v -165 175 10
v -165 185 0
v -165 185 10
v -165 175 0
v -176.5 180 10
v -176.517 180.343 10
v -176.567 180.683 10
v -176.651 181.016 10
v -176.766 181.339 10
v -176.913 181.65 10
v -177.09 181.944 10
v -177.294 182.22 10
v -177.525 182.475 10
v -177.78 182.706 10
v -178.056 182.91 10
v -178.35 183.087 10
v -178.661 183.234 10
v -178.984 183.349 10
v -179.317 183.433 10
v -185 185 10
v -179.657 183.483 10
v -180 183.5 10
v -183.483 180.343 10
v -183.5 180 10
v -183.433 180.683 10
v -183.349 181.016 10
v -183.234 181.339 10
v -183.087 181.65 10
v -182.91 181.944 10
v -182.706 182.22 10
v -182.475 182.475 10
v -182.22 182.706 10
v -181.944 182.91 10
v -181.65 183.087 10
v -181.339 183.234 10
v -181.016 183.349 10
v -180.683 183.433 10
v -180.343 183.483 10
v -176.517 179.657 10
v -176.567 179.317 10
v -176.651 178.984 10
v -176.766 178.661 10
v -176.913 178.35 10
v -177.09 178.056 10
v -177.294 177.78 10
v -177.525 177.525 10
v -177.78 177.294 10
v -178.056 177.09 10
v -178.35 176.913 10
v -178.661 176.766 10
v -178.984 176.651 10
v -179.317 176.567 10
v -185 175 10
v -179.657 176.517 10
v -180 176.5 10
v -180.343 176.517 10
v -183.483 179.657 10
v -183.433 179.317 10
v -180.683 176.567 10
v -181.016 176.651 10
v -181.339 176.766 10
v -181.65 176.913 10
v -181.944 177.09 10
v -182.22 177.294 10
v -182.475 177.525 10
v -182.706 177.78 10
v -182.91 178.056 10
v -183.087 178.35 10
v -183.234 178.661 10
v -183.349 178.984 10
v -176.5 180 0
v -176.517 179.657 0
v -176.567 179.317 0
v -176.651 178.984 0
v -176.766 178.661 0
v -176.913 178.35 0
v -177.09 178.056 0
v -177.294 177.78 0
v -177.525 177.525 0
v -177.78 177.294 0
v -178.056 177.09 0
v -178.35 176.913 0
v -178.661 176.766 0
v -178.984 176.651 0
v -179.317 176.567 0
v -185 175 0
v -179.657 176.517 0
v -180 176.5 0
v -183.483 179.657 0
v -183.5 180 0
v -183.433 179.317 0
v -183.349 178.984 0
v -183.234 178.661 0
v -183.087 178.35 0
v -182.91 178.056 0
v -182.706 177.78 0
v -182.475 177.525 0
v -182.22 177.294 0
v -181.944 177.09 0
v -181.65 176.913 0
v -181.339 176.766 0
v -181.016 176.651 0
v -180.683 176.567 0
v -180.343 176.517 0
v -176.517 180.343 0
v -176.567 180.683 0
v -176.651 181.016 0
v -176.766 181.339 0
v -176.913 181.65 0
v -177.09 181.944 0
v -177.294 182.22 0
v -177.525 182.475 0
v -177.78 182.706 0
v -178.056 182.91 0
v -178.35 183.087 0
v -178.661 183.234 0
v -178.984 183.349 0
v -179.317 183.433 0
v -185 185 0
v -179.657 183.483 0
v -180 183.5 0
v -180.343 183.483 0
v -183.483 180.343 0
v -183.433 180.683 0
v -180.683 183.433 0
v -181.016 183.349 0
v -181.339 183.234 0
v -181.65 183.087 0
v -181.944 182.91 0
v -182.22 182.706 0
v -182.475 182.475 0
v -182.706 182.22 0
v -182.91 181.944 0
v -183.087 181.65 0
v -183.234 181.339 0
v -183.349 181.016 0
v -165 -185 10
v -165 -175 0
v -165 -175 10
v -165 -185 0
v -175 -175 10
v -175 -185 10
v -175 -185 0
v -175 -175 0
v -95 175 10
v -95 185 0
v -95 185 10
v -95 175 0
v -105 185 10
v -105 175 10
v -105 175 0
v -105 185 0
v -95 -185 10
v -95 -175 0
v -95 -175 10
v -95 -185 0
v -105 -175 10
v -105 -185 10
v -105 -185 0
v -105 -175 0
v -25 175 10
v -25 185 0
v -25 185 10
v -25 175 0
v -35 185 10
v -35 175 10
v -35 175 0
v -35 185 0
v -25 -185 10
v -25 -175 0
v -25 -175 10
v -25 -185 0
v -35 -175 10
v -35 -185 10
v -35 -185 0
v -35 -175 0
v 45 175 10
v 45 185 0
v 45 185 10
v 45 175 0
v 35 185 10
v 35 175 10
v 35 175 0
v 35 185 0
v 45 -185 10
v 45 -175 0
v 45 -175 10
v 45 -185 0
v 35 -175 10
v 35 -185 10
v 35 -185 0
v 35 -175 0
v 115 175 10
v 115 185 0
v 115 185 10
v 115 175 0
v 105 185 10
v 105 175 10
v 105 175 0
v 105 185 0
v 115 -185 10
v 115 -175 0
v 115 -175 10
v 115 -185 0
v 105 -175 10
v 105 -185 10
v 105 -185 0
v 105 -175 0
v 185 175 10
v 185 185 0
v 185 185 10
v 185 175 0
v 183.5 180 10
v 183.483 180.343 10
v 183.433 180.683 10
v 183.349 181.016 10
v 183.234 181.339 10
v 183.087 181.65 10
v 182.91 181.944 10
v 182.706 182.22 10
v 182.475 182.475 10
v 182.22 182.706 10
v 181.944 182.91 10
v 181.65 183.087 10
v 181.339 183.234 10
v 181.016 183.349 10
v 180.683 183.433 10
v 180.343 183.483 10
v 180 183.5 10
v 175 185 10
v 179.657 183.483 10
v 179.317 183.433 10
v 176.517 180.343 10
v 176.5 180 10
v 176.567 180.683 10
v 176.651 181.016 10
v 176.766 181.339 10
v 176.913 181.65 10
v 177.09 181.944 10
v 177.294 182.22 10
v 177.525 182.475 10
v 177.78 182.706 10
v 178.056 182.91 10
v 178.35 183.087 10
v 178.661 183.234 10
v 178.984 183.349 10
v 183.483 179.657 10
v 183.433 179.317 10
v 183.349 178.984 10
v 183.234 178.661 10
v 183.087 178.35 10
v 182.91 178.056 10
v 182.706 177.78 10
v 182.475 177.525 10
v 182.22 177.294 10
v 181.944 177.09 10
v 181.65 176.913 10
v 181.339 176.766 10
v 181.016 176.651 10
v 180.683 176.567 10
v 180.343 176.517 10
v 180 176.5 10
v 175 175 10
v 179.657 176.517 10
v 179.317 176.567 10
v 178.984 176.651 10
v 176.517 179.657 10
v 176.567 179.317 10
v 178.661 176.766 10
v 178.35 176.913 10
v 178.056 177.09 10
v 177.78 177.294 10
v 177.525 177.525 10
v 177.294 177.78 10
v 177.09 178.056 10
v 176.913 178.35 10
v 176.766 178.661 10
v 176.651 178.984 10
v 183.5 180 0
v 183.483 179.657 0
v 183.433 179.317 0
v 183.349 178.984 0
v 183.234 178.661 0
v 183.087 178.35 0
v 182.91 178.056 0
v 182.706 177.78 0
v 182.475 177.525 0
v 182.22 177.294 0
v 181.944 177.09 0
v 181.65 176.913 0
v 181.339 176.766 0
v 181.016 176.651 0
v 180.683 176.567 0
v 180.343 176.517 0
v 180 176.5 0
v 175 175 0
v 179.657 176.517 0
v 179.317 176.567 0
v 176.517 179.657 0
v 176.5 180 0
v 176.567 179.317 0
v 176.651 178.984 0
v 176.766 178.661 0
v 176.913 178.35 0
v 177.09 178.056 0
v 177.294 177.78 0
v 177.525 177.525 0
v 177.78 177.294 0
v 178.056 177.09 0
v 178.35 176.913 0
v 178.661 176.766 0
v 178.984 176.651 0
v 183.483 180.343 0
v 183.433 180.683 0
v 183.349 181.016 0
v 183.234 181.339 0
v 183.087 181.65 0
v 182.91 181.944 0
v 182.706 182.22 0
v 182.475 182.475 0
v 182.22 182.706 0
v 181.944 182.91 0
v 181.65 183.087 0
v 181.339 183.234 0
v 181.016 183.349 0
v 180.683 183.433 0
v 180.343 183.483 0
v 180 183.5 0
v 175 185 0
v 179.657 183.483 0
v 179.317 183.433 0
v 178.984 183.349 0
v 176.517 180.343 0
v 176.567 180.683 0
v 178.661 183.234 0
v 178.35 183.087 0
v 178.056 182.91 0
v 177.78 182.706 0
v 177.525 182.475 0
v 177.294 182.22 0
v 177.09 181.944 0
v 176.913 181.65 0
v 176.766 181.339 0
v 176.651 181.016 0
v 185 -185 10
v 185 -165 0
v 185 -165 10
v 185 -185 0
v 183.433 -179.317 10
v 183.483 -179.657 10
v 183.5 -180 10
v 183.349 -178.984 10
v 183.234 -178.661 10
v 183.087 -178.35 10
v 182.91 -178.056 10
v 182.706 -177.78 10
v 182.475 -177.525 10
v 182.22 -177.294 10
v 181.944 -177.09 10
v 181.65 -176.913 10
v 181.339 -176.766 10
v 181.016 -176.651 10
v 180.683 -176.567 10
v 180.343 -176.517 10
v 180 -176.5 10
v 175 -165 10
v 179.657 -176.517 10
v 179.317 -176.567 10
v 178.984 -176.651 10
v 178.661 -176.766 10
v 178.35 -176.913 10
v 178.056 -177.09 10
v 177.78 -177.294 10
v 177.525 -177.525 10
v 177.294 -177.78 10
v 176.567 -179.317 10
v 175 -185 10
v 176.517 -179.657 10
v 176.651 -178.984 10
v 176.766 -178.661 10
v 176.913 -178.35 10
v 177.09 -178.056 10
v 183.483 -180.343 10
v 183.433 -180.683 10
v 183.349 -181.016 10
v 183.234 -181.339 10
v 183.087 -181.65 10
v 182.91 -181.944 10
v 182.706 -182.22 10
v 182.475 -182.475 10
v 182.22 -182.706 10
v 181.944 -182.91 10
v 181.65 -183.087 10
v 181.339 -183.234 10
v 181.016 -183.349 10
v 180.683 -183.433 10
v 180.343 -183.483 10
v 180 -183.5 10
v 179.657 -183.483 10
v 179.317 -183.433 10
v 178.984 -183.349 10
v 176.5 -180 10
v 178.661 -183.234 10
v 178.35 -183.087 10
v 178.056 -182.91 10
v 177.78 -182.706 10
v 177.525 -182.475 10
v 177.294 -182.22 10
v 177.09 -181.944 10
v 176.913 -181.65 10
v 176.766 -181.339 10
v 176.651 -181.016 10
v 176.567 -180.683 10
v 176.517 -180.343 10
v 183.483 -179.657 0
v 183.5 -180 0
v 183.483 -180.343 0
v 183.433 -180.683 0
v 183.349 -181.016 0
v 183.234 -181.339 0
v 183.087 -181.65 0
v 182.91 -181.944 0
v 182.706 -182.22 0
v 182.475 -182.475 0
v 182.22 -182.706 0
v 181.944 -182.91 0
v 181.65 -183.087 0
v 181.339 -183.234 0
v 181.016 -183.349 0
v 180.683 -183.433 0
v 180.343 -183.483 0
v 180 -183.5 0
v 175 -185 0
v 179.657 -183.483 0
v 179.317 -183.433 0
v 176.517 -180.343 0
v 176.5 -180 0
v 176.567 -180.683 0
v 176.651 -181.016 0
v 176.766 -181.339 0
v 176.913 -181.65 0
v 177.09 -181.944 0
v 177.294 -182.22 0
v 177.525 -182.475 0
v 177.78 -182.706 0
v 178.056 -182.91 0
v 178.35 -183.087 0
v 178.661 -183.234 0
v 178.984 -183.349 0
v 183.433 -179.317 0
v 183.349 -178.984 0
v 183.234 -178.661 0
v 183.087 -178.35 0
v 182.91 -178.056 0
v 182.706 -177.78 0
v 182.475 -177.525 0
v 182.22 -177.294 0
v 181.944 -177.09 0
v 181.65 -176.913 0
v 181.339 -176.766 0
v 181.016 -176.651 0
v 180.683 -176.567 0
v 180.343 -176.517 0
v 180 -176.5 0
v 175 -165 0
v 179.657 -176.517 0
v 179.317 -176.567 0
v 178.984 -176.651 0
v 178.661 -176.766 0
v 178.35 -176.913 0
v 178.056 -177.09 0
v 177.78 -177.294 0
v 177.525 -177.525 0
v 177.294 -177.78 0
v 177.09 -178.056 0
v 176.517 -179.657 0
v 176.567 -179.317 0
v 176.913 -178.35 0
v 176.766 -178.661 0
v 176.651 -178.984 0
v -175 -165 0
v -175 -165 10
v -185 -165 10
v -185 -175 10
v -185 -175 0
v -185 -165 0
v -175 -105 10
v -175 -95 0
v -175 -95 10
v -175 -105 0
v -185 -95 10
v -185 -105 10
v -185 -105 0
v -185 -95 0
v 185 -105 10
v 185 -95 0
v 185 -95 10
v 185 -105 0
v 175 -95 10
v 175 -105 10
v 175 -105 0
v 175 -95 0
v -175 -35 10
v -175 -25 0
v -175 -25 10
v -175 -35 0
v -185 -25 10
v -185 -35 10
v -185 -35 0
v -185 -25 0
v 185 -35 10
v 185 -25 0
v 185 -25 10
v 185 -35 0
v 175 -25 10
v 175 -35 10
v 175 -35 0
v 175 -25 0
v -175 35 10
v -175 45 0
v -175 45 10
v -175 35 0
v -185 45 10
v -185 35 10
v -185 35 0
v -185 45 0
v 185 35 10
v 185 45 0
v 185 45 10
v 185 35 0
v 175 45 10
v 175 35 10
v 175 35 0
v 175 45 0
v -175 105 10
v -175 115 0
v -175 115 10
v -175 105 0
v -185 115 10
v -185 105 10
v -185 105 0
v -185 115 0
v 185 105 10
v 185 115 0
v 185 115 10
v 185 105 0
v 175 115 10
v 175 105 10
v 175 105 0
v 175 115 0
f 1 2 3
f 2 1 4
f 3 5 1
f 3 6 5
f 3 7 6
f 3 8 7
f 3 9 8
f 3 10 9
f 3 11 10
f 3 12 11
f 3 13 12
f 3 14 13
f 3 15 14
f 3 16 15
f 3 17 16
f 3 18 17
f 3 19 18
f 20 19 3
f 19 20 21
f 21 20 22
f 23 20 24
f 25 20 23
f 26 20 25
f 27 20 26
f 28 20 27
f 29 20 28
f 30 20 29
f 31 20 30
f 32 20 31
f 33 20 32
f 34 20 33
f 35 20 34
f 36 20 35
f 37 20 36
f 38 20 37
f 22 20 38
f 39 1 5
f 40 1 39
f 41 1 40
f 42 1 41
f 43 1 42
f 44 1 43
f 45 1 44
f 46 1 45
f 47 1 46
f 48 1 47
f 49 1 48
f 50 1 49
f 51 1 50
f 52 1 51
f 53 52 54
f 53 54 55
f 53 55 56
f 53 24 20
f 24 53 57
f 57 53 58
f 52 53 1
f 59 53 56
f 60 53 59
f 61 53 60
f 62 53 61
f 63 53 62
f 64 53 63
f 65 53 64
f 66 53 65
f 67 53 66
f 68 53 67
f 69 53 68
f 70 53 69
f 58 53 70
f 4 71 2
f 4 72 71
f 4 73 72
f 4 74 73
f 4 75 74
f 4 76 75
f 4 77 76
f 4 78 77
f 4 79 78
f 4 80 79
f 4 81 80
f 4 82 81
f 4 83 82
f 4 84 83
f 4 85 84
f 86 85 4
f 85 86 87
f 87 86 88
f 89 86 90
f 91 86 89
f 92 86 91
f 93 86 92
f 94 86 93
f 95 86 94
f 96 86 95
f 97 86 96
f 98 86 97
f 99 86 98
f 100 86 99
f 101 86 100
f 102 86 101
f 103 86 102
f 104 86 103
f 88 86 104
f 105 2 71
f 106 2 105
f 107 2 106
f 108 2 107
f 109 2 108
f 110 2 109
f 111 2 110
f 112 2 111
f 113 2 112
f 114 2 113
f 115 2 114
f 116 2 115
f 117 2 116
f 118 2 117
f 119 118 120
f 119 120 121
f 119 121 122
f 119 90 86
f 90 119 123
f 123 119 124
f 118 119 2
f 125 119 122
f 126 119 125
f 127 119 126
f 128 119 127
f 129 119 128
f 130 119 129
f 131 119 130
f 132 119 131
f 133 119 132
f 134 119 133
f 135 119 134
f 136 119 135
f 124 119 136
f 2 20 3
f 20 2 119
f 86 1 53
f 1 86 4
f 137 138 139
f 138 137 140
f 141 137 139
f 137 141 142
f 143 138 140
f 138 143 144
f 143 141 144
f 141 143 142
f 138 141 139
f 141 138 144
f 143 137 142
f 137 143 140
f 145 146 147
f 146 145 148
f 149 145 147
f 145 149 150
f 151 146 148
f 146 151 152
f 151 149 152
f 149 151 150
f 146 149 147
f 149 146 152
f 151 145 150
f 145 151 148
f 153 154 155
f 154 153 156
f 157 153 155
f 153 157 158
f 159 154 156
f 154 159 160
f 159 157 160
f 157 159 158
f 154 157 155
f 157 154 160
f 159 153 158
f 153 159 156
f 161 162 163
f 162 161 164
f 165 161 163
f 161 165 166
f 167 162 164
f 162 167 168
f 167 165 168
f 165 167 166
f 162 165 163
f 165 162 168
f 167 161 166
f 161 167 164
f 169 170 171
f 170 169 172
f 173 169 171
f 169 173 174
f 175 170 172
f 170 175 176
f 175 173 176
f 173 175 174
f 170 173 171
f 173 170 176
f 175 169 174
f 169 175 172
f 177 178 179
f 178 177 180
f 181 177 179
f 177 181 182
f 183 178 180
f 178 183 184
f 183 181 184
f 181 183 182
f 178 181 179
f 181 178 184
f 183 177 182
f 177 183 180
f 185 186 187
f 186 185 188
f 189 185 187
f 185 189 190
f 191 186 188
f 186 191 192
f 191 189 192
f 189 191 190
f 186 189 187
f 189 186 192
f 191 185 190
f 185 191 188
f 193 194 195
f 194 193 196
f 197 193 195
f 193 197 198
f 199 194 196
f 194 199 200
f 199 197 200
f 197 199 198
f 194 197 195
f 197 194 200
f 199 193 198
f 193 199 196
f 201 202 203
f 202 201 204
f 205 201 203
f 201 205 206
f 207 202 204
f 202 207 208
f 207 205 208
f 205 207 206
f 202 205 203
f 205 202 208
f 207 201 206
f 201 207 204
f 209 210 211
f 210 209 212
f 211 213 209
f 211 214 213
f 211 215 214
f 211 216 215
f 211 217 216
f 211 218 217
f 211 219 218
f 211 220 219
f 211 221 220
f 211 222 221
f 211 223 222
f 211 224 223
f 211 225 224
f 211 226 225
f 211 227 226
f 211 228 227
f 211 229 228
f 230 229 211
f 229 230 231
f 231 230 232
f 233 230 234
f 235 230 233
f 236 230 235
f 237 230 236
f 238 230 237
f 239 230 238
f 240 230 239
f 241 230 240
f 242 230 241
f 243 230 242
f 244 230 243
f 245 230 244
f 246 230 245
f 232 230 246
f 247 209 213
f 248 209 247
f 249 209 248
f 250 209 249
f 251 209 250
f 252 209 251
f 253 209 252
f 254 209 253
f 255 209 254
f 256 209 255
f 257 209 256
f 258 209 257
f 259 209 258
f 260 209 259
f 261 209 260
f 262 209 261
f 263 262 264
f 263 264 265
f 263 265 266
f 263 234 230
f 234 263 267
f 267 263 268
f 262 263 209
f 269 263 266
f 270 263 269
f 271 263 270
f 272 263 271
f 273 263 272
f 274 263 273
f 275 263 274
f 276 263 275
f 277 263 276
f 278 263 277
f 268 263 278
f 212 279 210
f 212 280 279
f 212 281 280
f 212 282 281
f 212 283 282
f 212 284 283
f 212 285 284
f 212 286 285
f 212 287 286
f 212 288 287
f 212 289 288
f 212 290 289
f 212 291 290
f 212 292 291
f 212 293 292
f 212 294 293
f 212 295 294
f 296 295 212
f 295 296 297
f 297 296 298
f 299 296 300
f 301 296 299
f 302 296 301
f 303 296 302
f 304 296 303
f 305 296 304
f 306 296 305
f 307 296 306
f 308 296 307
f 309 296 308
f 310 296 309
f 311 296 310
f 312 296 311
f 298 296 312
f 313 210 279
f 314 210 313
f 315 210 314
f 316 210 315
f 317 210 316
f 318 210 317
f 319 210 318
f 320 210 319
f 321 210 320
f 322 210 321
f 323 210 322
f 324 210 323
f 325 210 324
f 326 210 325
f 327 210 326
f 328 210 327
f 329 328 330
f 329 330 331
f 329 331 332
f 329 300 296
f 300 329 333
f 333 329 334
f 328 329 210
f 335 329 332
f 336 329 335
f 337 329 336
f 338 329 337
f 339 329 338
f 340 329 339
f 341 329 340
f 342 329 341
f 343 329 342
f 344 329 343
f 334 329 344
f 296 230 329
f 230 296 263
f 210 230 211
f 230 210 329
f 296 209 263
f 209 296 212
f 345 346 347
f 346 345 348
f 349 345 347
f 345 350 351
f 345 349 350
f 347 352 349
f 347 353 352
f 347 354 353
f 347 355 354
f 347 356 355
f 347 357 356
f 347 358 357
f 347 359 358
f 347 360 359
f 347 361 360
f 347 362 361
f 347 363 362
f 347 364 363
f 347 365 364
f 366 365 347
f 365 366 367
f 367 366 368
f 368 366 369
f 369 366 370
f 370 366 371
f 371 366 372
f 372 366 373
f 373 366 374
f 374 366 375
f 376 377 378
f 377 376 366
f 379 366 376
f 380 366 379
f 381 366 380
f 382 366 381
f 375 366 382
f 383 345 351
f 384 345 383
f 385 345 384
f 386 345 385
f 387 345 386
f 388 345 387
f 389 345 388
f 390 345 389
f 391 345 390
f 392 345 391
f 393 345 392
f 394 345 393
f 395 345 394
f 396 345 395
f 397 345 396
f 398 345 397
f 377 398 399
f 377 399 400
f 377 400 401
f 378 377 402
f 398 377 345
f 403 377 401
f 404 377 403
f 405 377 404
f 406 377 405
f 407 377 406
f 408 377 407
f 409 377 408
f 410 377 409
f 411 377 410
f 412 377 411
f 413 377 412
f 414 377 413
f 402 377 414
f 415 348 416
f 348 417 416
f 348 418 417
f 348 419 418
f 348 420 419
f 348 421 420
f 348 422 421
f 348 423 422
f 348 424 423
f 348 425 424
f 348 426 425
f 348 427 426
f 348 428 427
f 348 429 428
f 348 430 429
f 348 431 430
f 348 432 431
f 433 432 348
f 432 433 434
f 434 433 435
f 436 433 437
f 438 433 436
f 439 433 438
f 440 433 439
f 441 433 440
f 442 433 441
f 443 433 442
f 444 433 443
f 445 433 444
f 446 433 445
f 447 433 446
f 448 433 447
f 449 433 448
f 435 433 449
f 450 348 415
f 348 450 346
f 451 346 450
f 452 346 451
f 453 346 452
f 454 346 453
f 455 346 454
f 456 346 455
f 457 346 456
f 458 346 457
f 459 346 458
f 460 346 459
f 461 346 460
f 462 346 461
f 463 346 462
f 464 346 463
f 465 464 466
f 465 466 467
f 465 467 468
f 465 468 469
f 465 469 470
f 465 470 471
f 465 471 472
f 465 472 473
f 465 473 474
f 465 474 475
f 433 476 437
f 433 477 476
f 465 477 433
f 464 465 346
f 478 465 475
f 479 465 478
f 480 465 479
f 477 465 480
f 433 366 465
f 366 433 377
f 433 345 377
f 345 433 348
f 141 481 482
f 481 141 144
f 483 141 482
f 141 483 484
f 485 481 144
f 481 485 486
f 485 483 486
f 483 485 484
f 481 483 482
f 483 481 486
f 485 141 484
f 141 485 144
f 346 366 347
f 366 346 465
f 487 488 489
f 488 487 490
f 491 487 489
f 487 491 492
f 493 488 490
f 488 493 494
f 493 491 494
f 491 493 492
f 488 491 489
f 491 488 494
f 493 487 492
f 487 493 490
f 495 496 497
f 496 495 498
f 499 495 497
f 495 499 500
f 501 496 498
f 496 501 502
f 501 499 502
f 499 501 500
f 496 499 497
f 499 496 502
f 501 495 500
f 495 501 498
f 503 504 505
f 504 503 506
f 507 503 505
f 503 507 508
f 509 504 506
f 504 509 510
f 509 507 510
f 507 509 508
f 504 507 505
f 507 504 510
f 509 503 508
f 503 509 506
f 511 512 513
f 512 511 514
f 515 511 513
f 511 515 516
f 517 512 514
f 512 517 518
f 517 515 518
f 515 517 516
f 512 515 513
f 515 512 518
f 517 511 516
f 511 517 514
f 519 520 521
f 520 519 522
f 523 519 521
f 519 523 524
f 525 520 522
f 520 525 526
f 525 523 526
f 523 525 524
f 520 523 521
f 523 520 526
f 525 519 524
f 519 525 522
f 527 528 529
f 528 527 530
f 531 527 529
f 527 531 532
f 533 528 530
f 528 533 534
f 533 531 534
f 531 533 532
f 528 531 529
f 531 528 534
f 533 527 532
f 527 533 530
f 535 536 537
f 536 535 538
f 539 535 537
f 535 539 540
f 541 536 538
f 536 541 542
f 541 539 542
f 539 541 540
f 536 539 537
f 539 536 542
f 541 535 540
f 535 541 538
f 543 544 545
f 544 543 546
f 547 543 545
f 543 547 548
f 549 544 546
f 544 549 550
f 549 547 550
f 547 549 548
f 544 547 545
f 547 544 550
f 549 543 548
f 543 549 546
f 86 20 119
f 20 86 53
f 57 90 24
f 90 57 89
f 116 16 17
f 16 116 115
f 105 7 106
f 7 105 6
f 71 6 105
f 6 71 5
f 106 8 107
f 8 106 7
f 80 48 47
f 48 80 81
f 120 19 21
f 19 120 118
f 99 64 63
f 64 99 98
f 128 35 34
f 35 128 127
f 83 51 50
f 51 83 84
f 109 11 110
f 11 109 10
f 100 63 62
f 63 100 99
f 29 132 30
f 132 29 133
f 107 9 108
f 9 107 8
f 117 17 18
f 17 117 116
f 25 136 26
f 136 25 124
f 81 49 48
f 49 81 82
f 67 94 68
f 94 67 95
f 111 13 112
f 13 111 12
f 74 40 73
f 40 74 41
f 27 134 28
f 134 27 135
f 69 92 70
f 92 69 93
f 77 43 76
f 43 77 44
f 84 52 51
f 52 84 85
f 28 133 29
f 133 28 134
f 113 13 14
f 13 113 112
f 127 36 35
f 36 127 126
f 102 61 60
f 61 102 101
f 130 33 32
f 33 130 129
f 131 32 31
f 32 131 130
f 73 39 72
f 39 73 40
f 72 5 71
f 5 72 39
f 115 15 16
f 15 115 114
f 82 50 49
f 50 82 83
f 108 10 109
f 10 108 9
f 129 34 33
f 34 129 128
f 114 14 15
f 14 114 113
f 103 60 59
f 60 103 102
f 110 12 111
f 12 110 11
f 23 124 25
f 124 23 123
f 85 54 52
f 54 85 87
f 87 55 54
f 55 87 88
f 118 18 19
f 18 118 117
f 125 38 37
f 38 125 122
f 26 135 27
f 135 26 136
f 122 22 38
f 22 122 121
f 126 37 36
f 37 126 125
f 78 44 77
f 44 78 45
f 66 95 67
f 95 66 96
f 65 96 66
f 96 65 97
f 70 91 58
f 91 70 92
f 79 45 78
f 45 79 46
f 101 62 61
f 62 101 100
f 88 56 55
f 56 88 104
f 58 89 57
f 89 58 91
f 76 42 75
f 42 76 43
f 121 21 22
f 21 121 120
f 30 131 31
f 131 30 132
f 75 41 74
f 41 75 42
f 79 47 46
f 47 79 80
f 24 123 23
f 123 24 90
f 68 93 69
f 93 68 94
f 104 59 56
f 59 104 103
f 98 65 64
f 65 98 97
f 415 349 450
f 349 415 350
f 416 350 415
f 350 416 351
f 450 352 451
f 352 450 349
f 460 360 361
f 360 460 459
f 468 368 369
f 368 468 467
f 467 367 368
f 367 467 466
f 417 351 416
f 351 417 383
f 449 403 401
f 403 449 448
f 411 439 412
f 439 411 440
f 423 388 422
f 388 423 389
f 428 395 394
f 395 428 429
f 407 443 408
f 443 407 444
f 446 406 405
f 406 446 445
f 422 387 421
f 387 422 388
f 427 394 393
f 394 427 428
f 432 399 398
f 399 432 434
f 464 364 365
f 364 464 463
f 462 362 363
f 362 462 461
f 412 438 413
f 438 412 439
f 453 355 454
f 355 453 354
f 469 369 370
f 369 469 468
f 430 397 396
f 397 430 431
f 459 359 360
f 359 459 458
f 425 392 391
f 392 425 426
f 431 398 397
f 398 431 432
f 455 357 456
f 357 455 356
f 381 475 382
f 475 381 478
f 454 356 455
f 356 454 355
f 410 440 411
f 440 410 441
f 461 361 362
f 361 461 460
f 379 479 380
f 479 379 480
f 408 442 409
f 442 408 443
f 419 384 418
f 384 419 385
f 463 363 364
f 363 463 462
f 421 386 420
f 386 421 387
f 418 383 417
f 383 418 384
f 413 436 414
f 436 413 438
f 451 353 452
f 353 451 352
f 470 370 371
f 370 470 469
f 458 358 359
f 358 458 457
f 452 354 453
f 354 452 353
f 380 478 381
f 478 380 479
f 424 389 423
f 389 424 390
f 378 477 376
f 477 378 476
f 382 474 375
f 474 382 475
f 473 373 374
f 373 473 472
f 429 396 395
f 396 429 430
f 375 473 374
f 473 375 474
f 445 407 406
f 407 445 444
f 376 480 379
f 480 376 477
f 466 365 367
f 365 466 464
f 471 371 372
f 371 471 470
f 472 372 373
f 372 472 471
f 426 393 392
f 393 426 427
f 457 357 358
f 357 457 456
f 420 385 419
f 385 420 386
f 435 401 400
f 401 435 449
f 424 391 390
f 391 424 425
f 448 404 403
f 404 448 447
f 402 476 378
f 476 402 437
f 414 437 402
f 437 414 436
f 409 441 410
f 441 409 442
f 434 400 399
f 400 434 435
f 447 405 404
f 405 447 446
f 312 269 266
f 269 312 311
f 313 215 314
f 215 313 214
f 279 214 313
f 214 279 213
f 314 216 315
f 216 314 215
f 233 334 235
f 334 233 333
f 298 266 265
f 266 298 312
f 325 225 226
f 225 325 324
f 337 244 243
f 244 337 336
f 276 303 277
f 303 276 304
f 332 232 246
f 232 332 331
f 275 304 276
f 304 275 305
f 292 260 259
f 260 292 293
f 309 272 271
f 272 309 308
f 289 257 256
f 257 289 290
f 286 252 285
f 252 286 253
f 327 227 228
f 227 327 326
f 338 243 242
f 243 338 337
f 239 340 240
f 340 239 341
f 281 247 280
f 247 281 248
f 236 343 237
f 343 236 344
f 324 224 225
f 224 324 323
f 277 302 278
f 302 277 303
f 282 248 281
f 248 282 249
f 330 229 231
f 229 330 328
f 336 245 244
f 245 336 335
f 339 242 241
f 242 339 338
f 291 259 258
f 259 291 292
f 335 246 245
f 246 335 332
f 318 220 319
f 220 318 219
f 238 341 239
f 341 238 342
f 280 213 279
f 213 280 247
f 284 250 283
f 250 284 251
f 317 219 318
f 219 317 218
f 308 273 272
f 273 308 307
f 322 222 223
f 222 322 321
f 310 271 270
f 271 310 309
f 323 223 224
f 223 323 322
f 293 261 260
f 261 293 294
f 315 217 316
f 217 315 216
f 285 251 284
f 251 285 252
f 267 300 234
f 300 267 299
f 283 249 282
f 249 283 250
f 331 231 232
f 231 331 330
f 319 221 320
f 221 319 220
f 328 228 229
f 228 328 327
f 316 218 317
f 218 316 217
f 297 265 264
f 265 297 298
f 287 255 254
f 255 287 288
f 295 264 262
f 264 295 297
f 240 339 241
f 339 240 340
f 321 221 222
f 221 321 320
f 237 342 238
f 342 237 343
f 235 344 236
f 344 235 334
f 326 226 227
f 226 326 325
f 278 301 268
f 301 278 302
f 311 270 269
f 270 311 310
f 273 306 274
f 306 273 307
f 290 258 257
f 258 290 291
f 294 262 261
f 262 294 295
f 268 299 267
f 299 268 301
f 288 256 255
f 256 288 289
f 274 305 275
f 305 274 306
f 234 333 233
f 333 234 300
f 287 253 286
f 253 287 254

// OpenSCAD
// ring_28.scad - ring index 28 (z bottom = 280 mm)
$fn = 64; bar = 10; half_b = bar/2; outer = 370; half_outer = outer/2;
front_y = 180; back_y = -180; left_x = -180; right_x = 180;
x_centers = [-170, -100, -30, 40, 110, 180];
z_centers = [5, 85, 155, 225, 295, 365, 435, 505, 575, 645, 715]; ring_z = 280;
module place_box(cx, cy, sx, sy) { translate([cx - sx/2, cy - sy/2, 0]) cube([sx, sy, bar]); }

difference() { union() {
    for (x = x_centers) { place_box(x, front_y, bar, bar); place_box(x, back_y, bar, bar); }
    for (y = x_centers) { place_box(left_x, y, bar, bar); place_box(right_x, y, bar, bar); }
    for (zc = z_centers) if ((zc - half_b < ring_z + bar) && (zc + half_b > ring_z)) {
        translate([-half_outer, front_y - half_b, 0]) cube([outer, bar, bar]);
        translate([-half_outer, back_y - half_b, 0])  cube([outer, bar, bar]);
        translate([left_x - half_b, -half_outer, 0])  cube([bar, outer, bar]);
        translate([right_x - half_b, -half_outer, 0]) cube([bar, outer, bar]);
    }
  }
  for (cx = [-180, 180]) for (cy = [-180, 180]) translate([cx, cy, 0]) cylinder(h = bar, r = 3.5, $fn = 64);
}
